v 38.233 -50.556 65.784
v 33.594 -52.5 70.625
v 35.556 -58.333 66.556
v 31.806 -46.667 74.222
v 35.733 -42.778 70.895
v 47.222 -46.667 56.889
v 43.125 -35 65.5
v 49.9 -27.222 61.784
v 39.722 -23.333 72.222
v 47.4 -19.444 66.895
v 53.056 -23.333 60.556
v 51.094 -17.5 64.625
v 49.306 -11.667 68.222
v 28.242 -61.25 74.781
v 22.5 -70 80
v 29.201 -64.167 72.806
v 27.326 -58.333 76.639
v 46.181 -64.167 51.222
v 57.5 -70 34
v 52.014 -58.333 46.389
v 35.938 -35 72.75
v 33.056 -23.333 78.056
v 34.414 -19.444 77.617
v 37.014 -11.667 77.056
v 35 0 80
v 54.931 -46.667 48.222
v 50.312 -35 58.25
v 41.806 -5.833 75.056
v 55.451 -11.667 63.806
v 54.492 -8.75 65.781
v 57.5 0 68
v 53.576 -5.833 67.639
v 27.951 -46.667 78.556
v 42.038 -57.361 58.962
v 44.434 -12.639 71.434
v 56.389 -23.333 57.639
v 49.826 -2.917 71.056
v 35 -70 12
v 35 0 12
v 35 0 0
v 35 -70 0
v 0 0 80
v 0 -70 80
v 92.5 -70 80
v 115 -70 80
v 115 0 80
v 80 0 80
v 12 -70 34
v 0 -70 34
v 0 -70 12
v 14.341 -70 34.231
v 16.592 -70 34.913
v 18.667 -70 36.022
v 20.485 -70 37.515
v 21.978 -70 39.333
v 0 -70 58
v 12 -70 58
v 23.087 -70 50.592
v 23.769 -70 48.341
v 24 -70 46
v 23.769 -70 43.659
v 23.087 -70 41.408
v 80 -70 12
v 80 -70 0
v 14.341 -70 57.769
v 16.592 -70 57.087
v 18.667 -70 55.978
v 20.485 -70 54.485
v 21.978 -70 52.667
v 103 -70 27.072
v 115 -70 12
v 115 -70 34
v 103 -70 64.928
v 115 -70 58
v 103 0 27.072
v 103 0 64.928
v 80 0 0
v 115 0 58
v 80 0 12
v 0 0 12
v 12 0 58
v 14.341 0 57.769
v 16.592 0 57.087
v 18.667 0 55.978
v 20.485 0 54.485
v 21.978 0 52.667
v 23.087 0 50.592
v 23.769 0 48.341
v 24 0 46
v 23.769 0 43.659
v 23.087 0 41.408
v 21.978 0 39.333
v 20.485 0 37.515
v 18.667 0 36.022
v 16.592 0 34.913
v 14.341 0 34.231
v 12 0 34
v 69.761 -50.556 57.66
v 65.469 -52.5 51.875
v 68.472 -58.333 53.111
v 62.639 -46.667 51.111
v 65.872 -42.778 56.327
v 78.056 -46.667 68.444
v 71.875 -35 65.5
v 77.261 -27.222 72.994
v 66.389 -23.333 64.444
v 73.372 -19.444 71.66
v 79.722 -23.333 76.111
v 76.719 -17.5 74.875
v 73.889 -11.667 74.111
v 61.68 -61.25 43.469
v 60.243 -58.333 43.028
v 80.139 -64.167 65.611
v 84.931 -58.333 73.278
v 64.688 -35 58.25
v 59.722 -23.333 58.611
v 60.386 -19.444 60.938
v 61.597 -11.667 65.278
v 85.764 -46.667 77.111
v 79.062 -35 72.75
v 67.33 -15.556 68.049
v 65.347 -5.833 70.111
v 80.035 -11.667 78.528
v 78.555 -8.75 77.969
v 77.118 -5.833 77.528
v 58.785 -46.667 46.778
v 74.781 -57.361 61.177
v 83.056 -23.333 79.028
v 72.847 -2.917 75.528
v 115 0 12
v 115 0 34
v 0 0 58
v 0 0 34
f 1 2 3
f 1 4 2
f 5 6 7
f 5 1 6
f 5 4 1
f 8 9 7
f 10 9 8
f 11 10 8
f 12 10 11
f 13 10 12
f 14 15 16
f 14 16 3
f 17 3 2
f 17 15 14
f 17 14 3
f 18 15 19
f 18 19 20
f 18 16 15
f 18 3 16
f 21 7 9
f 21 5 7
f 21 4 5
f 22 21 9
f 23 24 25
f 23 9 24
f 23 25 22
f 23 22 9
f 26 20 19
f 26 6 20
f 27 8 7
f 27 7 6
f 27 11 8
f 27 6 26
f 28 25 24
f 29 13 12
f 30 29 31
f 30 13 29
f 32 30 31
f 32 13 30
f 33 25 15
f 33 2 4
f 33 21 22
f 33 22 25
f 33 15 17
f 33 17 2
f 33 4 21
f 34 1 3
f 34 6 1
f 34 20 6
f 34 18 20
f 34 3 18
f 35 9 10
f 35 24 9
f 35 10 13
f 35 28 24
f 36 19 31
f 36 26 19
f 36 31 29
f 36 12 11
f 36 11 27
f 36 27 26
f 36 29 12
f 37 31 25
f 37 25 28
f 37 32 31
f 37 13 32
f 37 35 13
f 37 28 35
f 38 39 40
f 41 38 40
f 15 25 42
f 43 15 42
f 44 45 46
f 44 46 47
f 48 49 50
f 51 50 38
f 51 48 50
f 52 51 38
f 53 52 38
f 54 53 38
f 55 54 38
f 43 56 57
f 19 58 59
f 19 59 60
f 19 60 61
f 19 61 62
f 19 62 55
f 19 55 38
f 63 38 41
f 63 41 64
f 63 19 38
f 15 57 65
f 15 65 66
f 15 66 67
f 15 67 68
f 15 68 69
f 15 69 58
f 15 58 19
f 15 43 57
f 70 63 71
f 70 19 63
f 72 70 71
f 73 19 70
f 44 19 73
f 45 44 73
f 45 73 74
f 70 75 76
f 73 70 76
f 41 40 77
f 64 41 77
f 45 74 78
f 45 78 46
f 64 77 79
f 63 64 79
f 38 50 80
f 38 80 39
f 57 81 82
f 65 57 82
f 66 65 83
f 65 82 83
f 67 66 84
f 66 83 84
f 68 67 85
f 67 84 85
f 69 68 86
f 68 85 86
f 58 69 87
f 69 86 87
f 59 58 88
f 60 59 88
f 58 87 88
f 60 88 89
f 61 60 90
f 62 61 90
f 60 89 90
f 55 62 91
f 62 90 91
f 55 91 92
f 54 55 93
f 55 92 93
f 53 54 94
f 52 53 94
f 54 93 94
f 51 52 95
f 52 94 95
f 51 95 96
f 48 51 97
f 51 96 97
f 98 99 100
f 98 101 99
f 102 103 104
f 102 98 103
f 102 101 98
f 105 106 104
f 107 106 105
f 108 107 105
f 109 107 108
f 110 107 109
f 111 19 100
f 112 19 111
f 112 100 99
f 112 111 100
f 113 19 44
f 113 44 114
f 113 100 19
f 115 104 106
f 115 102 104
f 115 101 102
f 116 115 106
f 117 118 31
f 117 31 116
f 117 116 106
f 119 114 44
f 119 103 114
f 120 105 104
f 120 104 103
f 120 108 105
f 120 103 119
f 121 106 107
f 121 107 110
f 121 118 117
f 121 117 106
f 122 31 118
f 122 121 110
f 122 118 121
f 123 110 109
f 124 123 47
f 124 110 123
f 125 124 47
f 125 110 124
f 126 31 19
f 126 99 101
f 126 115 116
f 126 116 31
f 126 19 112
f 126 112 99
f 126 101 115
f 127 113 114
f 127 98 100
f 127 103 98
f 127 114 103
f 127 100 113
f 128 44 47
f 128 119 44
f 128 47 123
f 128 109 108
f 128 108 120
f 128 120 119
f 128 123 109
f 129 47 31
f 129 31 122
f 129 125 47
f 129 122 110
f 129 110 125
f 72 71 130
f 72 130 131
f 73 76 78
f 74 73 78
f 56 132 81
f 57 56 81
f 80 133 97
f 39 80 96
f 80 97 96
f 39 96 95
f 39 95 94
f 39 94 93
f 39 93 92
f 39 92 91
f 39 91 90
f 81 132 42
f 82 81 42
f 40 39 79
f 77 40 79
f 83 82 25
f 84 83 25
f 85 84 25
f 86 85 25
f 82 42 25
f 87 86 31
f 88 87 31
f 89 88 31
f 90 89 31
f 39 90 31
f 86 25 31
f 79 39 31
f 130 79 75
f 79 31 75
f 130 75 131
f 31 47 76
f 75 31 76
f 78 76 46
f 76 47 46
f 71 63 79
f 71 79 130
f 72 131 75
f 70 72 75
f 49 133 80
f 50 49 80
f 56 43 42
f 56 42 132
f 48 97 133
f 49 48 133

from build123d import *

# Parameters (mm, degrees)
F1_DEPTH = 70


with BuildPart() as f1:
    # F0 (on Front) → F1 (new body)
    with BuildSketch(Plane.XZ):
        with BuildLine():
            Line((0, 34), (0, 12))
            Line((0, 12), (35, 12))
            Line((35, 12), (35, 0))
            Line((35, 0), (80, 0))
            Line((80, 0), (80, 12))
            Line((80, 12), (115, 12))
            Line((115, 12), (115, 34))
            Line((115, 34), (103, 27.071797))
            Line((103, 27.071797), (103, 64.928203))
            Line((103, 64.928203), (115, 58))
            Line((115, 58), (115, 80))
            Line((115, 80), (0, 80))
            Line((0, 80), (0, 58))
            Line((0, 58), (12, 58))
            ThreePointArc((12, 58), (24, 46), (12, 34))
            Line((12, 34), (0, 34))
        make_face()
    extrude(amount=F1_DEPTH)

    # F3 (on face) → F4 section 0
    with BuildSketch(Plane.XZ.offset(70)):
        Polygon((92.5, 80), (22.5, 80), (57.5, 34), align=None)
    # F2 (on face) → F4 section 1
    with BuildSketch(Plane(origin=(0, 0, 0), x_dir=(-1, 0, 0), z_dir=(0, 1, 0))):
        Polygon((-80, 80), (-57.5, 68), (-35, 80), align=None)
    loft(mode=Mode.SUBTRACT)


solid = f1.part
